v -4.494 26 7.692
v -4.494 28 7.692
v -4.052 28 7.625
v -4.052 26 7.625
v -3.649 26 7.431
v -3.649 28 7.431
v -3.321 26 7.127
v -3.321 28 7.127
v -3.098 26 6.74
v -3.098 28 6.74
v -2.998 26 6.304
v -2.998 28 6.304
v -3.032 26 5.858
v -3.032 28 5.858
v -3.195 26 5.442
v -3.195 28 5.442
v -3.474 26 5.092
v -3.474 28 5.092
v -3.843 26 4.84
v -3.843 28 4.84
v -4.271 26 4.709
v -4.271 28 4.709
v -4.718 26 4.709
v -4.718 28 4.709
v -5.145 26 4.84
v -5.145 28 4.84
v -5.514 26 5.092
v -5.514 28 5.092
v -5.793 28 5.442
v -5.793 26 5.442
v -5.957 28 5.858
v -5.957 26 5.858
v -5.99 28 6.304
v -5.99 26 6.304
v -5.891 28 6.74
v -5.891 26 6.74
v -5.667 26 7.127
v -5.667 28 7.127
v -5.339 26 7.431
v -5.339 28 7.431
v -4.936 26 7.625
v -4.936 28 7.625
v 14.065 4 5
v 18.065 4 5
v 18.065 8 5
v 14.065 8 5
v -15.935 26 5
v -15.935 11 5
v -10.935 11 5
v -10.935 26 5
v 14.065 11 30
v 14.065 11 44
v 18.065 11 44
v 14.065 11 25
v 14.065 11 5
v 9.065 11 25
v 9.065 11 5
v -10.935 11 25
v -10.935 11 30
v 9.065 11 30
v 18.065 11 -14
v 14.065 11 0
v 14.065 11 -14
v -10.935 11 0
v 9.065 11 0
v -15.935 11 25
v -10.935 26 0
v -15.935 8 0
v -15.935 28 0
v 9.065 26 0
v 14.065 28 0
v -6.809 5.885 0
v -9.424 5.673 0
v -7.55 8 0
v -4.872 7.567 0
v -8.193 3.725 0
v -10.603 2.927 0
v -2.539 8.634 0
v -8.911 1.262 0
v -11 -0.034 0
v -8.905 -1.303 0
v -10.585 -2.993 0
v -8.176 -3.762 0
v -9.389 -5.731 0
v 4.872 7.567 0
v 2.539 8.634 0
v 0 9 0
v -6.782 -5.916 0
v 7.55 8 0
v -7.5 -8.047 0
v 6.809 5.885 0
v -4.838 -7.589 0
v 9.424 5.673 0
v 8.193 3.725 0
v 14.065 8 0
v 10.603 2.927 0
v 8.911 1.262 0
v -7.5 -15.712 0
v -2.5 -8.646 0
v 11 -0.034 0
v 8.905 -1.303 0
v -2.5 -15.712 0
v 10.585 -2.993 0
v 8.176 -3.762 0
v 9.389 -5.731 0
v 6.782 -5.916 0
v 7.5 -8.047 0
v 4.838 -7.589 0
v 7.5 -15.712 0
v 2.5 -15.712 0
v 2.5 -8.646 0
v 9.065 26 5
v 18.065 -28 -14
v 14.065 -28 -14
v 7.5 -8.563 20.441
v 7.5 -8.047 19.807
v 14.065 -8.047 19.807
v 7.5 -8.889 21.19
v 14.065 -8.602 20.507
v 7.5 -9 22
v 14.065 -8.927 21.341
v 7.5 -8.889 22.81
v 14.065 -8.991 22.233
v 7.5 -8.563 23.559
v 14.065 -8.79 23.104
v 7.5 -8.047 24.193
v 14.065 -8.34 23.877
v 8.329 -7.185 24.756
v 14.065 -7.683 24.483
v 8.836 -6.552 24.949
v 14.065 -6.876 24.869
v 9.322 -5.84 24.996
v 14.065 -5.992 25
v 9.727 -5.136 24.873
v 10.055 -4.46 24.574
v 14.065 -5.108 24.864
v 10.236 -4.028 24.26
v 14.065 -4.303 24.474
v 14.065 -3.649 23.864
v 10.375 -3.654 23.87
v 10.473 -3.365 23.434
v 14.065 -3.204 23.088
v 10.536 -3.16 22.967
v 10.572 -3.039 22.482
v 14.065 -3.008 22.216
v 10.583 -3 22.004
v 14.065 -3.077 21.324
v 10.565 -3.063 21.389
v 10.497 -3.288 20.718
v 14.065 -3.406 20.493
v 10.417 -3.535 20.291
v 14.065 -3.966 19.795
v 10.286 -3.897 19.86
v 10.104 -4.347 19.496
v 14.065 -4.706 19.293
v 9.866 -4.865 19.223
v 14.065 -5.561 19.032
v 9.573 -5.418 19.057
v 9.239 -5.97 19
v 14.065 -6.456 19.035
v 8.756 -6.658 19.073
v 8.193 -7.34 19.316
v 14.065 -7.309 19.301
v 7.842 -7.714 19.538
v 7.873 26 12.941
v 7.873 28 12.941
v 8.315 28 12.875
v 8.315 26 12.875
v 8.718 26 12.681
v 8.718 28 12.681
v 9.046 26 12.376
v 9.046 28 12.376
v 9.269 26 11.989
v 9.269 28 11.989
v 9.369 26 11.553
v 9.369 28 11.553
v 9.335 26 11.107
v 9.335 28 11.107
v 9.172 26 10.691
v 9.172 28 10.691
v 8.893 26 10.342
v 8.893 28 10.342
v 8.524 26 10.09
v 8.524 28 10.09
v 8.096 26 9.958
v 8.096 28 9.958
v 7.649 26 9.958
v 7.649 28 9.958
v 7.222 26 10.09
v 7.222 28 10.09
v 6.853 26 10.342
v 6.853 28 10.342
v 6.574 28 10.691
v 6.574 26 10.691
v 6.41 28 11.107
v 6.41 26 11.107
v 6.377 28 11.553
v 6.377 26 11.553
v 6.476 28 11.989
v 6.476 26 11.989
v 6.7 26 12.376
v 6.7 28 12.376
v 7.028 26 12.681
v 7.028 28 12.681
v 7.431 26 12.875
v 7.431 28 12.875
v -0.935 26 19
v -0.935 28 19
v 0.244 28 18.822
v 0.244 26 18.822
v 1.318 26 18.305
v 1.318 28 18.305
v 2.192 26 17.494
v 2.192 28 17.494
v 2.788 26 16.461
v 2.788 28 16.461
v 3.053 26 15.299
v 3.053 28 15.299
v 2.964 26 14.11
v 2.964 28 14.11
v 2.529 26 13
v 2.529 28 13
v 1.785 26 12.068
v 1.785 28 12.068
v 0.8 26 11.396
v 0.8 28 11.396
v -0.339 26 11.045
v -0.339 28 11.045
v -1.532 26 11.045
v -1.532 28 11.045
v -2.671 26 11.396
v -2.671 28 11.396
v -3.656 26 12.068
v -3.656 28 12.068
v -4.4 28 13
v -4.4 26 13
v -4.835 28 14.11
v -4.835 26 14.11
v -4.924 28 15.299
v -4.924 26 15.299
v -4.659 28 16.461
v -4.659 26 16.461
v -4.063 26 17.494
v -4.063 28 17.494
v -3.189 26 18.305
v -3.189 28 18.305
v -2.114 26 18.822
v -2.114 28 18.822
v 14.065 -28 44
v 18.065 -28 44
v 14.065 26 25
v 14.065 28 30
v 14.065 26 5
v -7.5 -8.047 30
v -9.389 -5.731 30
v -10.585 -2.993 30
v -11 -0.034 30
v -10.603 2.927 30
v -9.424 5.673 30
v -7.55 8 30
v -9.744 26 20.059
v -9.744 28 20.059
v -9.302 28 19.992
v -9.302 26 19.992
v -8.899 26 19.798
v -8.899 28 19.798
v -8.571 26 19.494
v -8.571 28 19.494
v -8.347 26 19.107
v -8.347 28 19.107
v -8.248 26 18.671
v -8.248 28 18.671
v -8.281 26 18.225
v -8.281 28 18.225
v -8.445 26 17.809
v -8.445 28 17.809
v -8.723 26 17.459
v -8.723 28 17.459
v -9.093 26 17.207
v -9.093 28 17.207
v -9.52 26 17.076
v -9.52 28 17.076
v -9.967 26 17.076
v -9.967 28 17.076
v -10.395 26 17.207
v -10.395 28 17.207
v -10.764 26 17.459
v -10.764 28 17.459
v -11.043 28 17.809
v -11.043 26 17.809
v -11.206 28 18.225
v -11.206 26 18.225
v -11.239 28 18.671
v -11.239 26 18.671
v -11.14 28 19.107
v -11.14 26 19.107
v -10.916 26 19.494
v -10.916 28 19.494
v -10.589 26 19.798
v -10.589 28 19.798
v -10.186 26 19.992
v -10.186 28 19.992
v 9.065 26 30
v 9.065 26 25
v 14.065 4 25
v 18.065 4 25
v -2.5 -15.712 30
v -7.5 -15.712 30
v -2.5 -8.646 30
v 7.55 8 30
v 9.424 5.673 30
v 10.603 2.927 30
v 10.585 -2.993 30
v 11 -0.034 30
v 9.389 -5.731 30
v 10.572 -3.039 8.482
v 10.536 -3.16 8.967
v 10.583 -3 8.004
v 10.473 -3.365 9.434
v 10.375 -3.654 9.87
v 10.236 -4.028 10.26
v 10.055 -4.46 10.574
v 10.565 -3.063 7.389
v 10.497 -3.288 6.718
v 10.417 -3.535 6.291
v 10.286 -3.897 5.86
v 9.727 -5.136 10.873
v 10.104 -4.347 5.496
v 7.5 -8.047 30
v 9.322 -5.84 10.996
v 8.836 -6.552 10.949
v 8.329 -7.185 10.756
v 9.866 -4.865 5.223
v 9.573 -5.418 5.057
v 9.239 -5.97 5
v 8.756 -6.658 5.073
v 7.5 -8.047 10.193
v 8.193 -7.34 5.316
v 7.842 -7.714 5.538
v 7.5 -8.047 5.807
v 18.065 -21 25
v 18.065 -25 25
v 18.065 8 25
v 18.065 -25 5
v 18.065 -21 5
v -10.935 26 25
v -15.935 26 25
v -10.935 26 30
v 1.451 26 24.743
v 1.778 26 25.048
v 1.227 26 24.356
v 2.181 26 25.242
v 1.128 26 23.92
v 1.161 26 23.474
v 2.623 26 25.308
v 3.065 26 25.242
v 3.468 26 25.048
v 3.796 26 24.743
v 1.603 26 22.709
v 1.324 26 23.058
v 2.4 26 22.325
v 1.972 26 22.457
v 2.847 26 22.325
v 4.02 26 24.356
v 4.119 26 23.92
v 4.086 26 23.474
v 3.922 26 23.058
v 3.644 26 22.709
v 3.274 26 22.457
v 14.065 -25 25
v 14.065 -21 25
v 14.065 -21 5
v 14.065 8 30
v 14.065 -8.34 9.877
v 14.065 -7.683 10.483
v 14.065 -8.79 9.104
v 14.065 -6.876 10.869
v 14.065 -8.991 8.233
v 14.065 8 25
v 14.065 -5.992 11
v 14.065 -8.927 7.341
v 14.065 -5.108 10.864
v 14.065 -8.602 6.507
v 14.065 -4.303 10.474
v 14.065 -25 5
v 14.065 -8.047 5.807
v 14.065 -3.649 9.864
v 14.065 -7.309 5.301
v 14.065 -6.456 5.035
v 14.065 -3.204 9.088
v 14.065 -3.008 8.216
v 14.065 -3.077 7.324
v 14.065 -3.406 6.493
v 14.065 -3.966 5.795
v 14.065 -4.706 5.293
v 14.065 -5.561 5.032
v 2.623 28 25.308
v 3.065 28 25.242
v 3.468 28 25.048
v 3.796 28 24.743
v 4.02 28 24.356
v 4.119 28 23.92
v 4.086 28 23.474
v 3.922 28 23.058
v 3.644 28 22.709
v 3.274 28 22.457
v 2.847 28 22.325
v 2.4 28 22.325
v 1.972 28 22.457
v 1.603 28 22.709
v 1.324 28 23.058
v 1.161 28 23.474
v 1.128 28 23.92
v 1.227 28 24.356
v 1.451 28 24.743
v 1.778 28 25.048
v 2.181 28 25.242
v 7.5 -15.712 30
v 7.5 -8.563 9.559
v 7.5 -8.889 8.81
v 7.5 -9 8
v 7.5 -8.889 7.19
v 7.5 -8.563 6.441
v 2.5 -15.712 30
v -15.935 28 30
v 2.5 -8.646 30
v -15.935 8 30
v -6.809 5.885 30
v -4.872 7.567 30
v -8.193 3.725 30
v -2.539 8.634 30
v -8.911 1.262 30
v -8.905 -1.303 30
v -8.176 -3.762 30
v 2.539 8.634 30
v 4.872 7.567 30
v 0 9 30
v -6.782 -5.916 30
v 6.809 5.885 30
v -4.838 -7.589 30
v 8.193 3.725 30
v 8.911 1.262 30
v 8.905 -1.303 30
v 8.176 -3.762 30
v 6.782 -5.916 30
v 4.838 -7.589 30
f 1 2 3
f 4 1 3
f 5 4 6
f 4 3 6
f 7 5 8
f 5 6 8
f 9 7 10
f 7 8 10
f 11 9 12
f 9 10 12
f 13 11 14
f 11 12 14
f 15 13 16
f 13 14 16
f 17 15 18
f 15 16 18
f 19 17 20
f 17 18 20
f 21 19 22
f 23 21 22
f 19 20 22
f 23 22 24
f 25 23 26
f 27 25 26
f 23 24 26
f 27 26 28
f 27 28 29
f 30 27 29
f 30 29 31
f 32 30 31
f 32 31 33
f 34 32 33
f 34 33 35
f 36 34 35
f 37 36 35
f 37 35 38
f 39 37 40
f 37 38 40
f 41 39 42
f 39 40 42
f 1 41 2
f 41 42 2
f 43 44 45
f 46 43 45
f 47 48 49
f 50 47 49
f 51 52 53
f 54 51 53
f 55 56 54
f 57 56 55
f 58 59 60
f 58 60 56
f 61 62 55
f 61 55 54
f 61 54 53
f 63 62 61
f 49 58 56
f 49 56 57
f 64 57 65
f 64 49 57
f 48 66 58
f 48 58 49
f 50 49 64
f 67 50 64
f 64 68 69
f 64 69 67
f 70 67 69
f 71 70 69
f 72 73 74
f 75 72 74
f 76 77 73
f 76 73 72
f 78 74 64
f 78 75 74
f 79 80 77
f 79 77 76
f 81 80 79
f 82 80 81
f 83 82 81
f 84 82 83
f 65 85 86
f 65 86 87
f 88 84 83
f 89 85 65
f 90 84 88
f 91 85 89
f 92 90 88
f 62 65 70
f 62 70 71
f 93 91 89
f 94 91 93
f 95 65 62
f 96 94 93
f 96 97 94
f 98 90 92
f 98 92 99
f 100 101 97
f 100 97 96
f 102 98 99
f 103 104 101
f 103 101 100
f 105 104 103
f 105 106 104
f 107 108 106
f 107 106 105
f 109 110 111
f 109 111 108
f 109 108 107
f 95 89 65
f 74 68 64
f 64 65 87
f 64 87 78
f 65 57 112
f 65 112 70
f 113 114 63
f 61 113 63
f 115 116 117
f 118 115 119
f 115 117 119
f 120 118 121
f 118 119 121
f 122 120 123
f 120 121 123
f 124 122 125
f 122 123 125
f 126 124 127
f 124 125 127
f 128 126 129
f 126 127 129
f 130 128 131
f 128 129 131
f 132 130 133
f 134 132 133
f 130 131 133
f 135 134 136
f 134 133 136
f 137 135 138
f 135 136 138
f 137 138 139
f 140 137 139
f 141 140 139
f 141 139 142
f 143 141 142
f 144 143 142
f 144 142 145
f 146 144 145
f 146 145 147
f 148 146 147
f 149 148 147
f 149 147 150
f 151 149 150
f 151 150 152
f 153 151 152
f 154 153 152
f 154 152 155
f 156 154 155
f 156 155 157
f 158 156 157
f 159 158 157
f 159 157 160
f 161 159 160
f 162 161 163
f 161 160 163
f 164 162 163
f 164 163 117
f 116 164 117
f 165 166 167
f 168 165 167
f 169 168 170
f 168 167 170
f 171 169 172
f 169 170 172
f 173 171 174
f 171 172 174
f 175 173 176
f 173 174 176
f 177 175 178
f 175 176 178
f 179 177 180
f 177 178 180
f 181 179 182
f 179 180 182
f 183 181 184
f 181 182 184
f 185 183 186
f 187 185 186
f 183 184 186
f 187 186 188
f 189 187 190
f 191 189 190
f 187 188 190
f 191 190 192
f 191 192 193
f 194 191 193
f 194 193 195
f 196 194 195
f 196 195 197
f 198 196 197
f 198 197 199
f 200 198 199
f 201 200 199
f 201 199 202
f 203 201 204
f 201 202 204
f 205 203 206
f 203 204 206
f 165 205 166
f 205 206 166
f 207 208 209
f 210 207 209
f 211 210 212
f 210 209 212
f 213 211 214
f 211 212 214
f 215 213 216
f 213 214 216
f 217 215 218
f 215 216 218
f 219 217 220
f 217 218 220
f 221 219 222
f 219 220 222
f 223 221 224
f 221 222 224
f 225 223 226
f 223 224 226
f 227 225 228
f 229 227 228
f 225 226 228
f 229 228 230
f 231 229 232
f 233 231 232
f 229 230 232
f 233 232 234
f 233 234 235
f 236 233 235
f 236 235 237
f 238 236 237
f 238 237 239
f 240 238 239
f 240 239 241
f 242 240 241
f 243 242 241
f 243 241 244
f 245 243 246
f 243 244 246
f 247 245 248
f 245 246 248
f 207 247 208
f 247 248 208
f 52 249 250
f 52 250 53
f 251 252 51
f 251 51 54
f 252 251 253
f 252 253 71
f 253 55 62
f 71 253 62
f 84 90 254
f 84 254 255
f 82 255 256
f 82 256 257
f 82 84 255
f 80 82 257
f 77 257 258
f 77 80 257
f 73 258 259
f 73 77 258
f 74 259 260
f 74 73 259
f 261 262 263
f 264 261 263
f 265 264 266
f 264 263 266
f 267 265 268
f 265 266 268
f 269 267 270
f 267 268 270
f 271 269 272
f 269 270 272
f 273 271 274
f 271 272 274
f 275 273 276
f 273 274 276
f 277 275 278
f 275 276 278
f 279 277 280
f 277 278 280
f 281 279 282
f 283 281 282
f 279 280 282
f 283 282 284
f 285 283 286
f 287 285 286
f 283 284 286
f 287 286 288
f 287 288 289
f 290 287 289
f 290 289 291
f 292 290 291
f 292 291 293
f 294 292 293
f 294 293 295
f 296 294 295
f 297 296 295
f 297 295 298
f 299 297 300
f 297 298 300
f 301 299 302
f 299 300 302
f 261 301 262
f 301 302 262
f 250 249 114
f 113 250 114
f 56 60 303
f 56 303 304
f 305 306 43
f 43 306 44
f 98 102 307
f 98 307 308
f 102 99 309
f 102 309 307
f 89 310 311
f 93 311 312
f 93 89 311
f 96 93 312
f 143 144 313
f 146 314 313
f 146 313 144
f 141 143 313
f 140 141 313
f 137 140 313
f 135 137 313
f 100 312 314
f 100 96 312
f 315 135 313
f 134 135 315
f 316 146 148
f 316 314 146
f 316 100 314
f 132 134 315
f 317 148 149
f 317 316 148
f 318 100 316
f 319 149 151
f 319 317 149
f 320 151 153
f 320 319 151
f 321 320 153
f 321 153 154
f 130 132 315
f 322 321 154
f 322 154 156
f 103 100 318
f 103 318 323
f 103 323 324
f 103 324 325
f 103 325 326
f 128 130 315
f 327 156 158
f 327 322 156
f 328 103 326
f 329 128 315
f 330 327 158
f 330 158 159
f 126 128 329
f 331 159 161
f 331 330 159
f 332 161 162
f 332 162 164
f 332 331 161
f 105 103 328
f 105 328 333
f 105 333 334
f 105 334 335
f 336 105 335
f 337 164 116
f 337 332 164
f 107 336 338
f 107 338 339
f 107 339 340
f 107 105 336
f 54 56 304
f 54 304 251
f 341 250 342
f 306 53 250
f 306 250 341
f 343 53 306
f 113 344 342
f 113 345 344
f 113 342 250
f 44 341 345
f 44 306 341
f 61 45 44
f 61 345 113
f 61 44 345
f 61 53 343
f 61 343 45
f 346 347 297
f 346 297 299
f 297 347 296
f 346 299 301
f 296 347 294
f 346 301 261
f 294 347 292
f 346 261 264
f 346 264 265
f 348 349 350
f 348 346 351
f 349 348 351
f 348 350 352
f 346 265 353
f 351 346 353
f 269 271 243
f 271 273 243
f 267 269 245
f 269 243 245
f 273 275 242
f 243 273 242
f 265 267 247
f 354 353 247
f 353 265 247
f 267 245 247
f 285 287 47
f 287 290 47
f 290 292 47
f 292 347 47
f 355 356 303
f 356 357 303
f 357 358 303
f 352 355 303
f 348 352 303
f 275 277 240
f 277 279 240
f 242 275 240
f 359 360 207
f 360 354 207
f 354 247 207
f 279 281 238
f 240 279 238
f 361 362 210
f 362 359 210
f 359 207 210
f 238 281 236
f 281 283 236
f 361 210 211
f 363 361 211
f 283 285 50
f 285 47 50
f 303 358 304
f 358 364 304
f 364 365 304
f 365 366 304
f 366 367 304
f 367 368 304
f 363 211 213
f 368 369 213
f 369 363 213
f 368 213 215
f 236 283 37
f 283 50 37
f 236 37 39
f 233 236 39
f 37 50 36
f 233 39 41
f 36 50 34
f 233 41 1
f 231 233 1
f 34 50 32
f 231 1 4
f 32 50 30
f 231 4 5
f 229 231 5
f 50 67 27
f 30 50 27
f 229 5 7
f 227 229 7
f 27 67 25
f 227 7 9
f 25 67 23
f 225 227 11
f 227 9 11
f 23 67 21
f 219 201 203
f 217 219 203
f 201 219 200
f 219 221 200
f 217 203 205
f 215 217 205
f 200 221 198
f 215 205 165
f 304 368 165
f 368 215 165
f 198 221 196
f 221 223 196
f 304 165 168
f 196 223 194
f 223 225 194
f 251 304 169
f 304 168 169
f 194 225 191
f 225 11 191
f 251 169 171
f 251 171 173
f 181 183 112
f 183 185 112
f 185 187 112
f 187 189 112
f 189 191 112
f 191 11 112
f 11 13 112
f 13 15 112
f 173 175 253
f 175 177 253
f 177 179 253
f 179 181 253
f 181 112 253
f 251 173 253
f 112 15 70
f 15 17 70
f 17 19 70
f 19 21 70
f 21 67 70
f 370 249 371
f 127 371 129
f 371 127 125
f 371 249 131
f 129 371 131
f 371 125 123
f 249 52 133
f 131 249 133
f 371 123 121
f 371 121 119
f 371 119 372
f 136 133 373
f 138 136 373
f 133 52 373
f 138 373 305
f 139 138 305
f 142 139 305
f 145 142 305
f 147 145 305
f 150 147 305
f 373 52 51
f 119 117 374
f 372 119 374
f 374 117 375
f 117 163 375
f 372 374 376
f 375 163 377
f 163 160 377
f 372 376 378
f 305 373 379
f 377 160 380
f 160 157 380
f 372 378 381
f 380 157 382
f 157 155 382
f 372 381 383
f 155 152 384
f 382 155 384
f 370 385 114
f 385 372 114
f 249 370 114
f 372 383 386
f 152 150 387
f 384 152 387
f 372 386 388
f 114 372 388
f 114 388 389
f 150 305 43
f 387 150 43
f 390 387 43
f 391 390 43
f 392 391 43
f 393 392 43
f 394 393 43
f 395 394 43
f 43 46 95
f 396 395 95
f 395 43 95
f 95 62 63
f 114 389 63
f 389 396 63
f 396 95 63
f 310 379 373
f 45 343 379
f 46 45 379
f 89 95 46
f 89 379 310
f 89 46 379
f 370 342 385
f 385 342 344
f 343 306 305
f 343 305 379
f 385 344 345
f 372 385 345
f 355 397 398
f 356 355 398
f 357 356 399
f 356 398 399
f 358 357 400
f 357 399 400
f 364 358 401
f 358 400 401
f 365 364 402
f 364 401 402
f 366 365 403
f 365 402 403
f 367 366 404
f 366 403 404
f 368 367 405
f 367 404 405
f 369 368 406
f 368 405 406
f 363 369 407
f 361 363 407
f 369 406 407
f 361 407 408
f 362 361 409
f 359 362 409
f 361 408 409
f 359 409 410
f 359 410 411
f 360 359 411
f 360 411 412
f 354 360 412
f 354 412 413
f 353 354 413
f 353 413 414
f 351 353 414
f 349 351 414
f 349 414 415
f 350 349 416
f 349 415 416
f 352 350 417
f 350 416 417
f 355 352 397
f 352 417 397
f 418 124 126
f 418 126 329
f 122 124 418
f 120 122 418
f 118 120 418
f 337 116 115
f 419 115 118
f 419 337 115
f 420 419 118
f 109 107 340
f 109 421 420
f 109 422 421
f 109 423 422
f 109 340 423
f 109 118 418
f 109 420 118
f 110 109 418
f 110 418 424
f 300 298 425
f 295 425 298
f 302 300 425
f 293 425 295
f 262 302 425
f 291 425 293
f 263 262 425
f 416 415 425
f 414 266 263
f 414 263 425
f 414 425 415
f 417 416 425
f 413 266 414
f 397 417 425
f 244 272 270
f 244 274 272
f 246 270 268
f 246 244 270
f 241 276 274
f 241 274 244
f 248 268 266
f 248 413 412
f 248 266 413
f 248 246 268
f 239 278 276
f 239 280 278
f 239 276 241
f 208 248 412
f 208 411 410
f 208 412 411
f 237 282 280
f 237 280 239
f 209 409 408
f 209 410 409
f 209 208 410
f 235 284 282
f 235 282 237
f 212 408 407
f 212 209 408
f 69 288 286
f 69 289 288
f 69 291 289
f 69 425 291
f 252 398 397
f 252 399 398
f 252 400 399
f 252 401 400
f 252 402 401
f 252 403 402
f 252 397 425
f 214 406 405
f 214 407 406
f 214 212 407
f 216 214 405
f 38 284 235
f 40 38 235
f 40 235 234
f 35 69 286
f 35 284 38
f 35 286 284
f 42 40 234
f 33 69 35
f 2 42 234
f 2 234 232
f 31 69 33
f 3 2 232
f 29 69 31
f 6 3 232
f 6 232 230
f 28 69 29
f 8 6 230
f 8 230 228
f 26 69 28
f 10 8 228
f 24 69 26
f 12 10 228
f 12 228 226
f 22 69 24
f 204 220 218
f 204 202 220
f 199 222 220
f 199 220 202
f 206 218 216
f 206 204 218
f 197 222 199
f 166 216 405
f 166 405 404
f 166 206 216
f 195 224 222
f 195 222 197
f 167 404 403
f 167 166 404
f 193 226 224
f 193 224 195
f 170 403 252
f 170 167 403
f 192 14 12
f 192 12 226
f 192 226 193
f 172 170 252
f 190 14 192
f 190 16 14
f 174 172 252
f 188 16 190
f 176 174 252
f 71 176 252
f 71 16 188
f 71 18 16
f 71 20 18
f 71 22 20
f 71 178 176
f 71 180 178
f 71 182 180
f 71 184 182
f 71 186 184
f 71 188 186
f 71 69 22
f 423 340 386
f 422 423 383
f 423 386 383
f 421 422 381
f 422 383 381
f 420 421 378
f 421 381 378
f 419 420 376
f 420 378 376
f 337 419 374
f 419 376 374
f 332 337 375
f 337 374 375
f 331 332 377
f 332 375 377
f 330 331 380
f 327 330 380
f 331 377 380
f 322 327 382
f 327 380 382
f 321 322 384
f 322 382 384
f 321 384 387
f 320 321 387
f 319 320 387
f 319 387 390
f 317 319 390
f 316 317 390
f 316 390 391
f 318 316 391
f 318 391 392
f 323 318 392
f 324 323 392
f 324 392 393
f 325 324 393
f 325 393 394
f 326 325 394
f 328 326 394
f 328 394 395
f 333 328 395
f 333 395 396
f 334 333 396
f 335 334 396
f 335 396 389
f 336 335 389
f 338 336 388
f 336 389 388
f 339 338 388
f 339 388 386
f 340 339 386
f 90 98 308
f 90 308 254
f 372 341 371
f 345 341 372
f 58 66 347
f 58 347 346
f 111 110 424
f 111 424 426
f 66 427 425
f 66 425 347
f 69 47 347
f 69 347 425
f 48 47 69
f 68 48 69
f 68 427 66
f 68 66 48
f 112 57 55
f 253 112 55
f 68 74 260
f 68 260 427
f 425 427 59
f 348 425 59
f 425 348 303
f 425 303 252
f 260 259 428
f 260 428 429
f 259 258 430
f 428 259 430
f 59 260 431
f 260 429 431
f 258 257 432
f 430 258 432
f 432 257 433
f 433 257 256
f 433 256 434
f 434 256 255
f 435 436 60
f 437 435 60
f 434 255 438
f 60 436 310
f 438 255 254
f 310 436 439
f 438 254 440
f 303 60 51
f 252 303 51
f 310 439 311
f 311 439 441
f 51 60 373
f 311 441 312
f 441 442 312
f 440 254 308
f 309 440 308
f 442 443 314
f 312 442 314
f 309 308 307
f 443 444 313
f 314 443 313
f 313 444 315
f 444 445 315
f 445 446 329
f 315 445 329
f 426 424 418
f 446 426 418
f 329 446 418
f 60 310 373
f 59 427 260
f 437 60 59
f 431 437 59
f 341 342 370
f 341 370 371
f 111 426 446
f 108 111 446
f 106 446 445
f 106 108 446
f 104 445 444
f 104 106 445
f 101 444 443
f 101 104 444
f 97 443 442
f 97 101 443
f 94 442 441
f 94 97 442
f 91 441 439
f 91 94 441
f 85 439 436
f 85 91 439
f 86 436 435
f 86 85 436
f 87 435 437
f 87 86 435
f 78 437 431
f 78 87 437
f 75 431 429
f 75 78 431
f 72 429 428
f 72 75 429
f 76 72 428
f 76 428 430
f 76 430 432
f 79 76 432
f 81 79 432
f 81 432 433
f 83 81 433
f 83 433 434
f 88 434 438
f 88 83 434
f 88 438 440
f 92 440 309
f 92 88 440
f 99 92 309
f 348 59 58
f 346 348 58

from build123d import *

# Parameters (mm, degrees)
SUPPORTOMOTORE_DEPTH     = 30
SCHIZZO2_W               = 58
SCHIZZO2_H               = 39
SUPPORTOESC_DEPTH        = 4
COLONNESUPPORTOESC_REACH = 62.166
SCHIZZO3_R               = 3
SCHIZZO7_W               = 5
SCHIZZO7_H               = 5
SUPPORTIBASEMOTORE_DEPTH = 15
SCHIZZO8_W               = 30
SCHIZZO8_H               = 30
BASEMOTORE_DEPTH         = 2
SCHIZZO9_R               = 1.5
SCHIZZO9_R_2             = 4
FORIAGGANCIOMOTORE_DEPTH = 2
SCHIZZO10_W              = 20
SCHIZZO10_H              = 4
APERTURAFASCETTA_DEPTH   = 4


with BuildPart() as part:
    # Schizzo1 → SupportoMotore (new body)
    with BuildSketch(Plane.XY):
        with BuildLine():
            Line((-2.5, -10.712142643), (-2.5, -15.712142643))
            Line((-2.5, -15.712142643), (-7.5, -15.712142643))
            Line((-7.5, -15.712142643), (-7.5, -8.04673847))
            ThreePointArc((-7.5, -8.04673847), (-10.999946955, -0.034161219), (-7.549834435, 8))
            Line((-7.549834435, 8), (-15.935446939, 8))
            Line((-15.935446939, 8), (-15.935446939, 11))
            Line((-15.935446939, 11), (14.064553061, 11))
            Line((14.064553061, 11), (14.064553061, 8))
            Line((14.064553061, 8), (7.549834435, 8))
            ThreePointArc((7.549834435, 8), (10.999946955, -0.034161219), (7.5, -8.04673847))
            Line((7.5, -8.04673847), (7.5, -15.712142643))
            Line((7.5, -15.712142643), (2.5, -15.712142643))
            Line((2.5, -15.712142643), (2.5, -10.712142643))
            Line((2.5, -10.712142643), (2.5, -8.645808233))
            ThreePointArc((2.5, -8.645808233), (0, 9), (-2.5, -8.645808233))
            Line((-2.5, -8.645808233), (-2.5, -10.712142643))
        make_face()
    extrude(amount=SUPPORTOMOTORE_DEPTH)

    # Schizzo2 → SupportoESC (add)
    with BuildSketch(Plane(origin=(14.064553061, 0, 0), x_dir=(0, 0, -1), z_dir=(1, 0, 0))):
        with Locations((-15, -8.5)):
            Rectangle(SCHIZZO2_W, SCHIZZO2_H)
    extrude(amount=SUPPORTOESC_DEPTH)

    # Schizzo3 → ColonneSupportoESC (add, up to next)
    with BuildSketch(Plane.ZY.offset(-14.064553061), mode=Mode.PRIVATE) as colonnesupportoesc_sk1:
        with Locations(Location((22, -6, 0), (0, 0, 223.019415965))):
            Circle(SCHIZZO3_R)
    colonnesupportoesc_tool1 = extrude(colonnesupportoesc_sk1.sketch, amount=COLONNESUPPORTOESC_REACH, mode=Mode.PRIVATE) - part.part
    # Schizzo3 → ColonneSupportoESC (add, up to next)
    with BuildSketch(Plane.ZY.offset(-14.064553061), mode=Mode.PRIVATE) as colonnesupportoesc_sk2:
        with Locations(Location((8, -6, 0), (0, 0, 223.019415965))):
            Circle(SCHIZZO3_R)
    colonnesupportoesc_tool2 = extrude(colonnesupportoesc_sk2.sketch, amount=COLONNESUPPORTOESC_REACH, mode=Mode.PRIVATE) - part.part
    add(colonnesupportoesc_tool1.solids().sort_by_distance((14.064553, -6, 22))[0])
    add(colonnesupportoesc_tool2.solids().sort_by_distance((14.064553, -6, 8))[0])

    # Schizzo7 → SupportiBaseMotore (add)
    with BuildSketch(Plane(origin=(0, 11, 0), x_dir=(1, 0, 0), z_dir=(0, 1, 0))):
        with Locations((-13.435446939, -27.5)):
            Rectangle(SCHIZZO7_W, SCHIZZO7_H)
        with Locations((11.564553061, -27.5)):
            Rectangle(SCHIZZO7_W, SCHIZZO7_H)
        with Locations((11.564553061, -2.5)):
            Rectangle(SCHIZZO7_W, SCHIZZO7_H)
        with Locations((-13.435446939, -2.5)):
            Rectangle(SCHIZZO7_W, SCHIZZO7_H)
    extrude(amount=SUPPORTIBASEMOTORE_DEPTH)

    # Schizzo8 → BaseMotore (add)
    with BuildSketch(Plane(origin=(0, 26, 0), x_dir=(1, 0, 0), z_dir=(0, 1, 0))):
        with Locations((-0.935446939, -15)):
            Rectangle(SCHIZZO8_W, SCHIZZO8_H)
    extrude(amount=BASEMOTORE_DEPTH)

    # Schizzo9 → ForiAggancioMotore (cut)
    with BuildSketch(Plane(origin=(0, 28, 0), x_dir=(1, 0, 0), z_dir=(0, 1, 0))):
        with Locations(Location((2.623315698, -23.808246618, 0), (0, 0, 270))):
            Circle(SCHIZZO9_R)
        with Locations(Location((-9.743693557, -18.558762637, 0), (0, 0, 270))):
            Circle(SCHIZZO9_R)
        with Locations(Location((-4.494209576, -6.191753382, 0), (0, 0, 270))):
            Circle(SCHIZZO9_R)
        with Locations(Location((7.872799679, -11.441237363, 0), (0, 0, 270))):
            Circle(SCHIZZO9_R)
        with Locations(Location((-0.935446939, -15, 0), (0, 0, 270))):
            Circle(SCHIZZO9_R_2)
    extrude(amount=-FORIAGGANCIOMOTORE_DEPTH, mode=Mode.SUBTRACT)

    # Schizzo10 → AperturaFascetta (cut)
    with BuildSketch(Plane(origin=(18.064553061, 0, 0), x_dir=(0, 0, -1), z_dir=(1, 0, 0))):
        with Locations((-15, 6)):
            Rectangle(SCHIZZO10_W, SCHIZZO10_H)
        with Locations((-15, -23)):
            Rectangle(SCHIZZO10_W, SCHIZZO10_H)
    extrude(amount=-APERTURAFASCETTA_DEPTH, mode=Mode.SUBTRACT)


solid = part.part
